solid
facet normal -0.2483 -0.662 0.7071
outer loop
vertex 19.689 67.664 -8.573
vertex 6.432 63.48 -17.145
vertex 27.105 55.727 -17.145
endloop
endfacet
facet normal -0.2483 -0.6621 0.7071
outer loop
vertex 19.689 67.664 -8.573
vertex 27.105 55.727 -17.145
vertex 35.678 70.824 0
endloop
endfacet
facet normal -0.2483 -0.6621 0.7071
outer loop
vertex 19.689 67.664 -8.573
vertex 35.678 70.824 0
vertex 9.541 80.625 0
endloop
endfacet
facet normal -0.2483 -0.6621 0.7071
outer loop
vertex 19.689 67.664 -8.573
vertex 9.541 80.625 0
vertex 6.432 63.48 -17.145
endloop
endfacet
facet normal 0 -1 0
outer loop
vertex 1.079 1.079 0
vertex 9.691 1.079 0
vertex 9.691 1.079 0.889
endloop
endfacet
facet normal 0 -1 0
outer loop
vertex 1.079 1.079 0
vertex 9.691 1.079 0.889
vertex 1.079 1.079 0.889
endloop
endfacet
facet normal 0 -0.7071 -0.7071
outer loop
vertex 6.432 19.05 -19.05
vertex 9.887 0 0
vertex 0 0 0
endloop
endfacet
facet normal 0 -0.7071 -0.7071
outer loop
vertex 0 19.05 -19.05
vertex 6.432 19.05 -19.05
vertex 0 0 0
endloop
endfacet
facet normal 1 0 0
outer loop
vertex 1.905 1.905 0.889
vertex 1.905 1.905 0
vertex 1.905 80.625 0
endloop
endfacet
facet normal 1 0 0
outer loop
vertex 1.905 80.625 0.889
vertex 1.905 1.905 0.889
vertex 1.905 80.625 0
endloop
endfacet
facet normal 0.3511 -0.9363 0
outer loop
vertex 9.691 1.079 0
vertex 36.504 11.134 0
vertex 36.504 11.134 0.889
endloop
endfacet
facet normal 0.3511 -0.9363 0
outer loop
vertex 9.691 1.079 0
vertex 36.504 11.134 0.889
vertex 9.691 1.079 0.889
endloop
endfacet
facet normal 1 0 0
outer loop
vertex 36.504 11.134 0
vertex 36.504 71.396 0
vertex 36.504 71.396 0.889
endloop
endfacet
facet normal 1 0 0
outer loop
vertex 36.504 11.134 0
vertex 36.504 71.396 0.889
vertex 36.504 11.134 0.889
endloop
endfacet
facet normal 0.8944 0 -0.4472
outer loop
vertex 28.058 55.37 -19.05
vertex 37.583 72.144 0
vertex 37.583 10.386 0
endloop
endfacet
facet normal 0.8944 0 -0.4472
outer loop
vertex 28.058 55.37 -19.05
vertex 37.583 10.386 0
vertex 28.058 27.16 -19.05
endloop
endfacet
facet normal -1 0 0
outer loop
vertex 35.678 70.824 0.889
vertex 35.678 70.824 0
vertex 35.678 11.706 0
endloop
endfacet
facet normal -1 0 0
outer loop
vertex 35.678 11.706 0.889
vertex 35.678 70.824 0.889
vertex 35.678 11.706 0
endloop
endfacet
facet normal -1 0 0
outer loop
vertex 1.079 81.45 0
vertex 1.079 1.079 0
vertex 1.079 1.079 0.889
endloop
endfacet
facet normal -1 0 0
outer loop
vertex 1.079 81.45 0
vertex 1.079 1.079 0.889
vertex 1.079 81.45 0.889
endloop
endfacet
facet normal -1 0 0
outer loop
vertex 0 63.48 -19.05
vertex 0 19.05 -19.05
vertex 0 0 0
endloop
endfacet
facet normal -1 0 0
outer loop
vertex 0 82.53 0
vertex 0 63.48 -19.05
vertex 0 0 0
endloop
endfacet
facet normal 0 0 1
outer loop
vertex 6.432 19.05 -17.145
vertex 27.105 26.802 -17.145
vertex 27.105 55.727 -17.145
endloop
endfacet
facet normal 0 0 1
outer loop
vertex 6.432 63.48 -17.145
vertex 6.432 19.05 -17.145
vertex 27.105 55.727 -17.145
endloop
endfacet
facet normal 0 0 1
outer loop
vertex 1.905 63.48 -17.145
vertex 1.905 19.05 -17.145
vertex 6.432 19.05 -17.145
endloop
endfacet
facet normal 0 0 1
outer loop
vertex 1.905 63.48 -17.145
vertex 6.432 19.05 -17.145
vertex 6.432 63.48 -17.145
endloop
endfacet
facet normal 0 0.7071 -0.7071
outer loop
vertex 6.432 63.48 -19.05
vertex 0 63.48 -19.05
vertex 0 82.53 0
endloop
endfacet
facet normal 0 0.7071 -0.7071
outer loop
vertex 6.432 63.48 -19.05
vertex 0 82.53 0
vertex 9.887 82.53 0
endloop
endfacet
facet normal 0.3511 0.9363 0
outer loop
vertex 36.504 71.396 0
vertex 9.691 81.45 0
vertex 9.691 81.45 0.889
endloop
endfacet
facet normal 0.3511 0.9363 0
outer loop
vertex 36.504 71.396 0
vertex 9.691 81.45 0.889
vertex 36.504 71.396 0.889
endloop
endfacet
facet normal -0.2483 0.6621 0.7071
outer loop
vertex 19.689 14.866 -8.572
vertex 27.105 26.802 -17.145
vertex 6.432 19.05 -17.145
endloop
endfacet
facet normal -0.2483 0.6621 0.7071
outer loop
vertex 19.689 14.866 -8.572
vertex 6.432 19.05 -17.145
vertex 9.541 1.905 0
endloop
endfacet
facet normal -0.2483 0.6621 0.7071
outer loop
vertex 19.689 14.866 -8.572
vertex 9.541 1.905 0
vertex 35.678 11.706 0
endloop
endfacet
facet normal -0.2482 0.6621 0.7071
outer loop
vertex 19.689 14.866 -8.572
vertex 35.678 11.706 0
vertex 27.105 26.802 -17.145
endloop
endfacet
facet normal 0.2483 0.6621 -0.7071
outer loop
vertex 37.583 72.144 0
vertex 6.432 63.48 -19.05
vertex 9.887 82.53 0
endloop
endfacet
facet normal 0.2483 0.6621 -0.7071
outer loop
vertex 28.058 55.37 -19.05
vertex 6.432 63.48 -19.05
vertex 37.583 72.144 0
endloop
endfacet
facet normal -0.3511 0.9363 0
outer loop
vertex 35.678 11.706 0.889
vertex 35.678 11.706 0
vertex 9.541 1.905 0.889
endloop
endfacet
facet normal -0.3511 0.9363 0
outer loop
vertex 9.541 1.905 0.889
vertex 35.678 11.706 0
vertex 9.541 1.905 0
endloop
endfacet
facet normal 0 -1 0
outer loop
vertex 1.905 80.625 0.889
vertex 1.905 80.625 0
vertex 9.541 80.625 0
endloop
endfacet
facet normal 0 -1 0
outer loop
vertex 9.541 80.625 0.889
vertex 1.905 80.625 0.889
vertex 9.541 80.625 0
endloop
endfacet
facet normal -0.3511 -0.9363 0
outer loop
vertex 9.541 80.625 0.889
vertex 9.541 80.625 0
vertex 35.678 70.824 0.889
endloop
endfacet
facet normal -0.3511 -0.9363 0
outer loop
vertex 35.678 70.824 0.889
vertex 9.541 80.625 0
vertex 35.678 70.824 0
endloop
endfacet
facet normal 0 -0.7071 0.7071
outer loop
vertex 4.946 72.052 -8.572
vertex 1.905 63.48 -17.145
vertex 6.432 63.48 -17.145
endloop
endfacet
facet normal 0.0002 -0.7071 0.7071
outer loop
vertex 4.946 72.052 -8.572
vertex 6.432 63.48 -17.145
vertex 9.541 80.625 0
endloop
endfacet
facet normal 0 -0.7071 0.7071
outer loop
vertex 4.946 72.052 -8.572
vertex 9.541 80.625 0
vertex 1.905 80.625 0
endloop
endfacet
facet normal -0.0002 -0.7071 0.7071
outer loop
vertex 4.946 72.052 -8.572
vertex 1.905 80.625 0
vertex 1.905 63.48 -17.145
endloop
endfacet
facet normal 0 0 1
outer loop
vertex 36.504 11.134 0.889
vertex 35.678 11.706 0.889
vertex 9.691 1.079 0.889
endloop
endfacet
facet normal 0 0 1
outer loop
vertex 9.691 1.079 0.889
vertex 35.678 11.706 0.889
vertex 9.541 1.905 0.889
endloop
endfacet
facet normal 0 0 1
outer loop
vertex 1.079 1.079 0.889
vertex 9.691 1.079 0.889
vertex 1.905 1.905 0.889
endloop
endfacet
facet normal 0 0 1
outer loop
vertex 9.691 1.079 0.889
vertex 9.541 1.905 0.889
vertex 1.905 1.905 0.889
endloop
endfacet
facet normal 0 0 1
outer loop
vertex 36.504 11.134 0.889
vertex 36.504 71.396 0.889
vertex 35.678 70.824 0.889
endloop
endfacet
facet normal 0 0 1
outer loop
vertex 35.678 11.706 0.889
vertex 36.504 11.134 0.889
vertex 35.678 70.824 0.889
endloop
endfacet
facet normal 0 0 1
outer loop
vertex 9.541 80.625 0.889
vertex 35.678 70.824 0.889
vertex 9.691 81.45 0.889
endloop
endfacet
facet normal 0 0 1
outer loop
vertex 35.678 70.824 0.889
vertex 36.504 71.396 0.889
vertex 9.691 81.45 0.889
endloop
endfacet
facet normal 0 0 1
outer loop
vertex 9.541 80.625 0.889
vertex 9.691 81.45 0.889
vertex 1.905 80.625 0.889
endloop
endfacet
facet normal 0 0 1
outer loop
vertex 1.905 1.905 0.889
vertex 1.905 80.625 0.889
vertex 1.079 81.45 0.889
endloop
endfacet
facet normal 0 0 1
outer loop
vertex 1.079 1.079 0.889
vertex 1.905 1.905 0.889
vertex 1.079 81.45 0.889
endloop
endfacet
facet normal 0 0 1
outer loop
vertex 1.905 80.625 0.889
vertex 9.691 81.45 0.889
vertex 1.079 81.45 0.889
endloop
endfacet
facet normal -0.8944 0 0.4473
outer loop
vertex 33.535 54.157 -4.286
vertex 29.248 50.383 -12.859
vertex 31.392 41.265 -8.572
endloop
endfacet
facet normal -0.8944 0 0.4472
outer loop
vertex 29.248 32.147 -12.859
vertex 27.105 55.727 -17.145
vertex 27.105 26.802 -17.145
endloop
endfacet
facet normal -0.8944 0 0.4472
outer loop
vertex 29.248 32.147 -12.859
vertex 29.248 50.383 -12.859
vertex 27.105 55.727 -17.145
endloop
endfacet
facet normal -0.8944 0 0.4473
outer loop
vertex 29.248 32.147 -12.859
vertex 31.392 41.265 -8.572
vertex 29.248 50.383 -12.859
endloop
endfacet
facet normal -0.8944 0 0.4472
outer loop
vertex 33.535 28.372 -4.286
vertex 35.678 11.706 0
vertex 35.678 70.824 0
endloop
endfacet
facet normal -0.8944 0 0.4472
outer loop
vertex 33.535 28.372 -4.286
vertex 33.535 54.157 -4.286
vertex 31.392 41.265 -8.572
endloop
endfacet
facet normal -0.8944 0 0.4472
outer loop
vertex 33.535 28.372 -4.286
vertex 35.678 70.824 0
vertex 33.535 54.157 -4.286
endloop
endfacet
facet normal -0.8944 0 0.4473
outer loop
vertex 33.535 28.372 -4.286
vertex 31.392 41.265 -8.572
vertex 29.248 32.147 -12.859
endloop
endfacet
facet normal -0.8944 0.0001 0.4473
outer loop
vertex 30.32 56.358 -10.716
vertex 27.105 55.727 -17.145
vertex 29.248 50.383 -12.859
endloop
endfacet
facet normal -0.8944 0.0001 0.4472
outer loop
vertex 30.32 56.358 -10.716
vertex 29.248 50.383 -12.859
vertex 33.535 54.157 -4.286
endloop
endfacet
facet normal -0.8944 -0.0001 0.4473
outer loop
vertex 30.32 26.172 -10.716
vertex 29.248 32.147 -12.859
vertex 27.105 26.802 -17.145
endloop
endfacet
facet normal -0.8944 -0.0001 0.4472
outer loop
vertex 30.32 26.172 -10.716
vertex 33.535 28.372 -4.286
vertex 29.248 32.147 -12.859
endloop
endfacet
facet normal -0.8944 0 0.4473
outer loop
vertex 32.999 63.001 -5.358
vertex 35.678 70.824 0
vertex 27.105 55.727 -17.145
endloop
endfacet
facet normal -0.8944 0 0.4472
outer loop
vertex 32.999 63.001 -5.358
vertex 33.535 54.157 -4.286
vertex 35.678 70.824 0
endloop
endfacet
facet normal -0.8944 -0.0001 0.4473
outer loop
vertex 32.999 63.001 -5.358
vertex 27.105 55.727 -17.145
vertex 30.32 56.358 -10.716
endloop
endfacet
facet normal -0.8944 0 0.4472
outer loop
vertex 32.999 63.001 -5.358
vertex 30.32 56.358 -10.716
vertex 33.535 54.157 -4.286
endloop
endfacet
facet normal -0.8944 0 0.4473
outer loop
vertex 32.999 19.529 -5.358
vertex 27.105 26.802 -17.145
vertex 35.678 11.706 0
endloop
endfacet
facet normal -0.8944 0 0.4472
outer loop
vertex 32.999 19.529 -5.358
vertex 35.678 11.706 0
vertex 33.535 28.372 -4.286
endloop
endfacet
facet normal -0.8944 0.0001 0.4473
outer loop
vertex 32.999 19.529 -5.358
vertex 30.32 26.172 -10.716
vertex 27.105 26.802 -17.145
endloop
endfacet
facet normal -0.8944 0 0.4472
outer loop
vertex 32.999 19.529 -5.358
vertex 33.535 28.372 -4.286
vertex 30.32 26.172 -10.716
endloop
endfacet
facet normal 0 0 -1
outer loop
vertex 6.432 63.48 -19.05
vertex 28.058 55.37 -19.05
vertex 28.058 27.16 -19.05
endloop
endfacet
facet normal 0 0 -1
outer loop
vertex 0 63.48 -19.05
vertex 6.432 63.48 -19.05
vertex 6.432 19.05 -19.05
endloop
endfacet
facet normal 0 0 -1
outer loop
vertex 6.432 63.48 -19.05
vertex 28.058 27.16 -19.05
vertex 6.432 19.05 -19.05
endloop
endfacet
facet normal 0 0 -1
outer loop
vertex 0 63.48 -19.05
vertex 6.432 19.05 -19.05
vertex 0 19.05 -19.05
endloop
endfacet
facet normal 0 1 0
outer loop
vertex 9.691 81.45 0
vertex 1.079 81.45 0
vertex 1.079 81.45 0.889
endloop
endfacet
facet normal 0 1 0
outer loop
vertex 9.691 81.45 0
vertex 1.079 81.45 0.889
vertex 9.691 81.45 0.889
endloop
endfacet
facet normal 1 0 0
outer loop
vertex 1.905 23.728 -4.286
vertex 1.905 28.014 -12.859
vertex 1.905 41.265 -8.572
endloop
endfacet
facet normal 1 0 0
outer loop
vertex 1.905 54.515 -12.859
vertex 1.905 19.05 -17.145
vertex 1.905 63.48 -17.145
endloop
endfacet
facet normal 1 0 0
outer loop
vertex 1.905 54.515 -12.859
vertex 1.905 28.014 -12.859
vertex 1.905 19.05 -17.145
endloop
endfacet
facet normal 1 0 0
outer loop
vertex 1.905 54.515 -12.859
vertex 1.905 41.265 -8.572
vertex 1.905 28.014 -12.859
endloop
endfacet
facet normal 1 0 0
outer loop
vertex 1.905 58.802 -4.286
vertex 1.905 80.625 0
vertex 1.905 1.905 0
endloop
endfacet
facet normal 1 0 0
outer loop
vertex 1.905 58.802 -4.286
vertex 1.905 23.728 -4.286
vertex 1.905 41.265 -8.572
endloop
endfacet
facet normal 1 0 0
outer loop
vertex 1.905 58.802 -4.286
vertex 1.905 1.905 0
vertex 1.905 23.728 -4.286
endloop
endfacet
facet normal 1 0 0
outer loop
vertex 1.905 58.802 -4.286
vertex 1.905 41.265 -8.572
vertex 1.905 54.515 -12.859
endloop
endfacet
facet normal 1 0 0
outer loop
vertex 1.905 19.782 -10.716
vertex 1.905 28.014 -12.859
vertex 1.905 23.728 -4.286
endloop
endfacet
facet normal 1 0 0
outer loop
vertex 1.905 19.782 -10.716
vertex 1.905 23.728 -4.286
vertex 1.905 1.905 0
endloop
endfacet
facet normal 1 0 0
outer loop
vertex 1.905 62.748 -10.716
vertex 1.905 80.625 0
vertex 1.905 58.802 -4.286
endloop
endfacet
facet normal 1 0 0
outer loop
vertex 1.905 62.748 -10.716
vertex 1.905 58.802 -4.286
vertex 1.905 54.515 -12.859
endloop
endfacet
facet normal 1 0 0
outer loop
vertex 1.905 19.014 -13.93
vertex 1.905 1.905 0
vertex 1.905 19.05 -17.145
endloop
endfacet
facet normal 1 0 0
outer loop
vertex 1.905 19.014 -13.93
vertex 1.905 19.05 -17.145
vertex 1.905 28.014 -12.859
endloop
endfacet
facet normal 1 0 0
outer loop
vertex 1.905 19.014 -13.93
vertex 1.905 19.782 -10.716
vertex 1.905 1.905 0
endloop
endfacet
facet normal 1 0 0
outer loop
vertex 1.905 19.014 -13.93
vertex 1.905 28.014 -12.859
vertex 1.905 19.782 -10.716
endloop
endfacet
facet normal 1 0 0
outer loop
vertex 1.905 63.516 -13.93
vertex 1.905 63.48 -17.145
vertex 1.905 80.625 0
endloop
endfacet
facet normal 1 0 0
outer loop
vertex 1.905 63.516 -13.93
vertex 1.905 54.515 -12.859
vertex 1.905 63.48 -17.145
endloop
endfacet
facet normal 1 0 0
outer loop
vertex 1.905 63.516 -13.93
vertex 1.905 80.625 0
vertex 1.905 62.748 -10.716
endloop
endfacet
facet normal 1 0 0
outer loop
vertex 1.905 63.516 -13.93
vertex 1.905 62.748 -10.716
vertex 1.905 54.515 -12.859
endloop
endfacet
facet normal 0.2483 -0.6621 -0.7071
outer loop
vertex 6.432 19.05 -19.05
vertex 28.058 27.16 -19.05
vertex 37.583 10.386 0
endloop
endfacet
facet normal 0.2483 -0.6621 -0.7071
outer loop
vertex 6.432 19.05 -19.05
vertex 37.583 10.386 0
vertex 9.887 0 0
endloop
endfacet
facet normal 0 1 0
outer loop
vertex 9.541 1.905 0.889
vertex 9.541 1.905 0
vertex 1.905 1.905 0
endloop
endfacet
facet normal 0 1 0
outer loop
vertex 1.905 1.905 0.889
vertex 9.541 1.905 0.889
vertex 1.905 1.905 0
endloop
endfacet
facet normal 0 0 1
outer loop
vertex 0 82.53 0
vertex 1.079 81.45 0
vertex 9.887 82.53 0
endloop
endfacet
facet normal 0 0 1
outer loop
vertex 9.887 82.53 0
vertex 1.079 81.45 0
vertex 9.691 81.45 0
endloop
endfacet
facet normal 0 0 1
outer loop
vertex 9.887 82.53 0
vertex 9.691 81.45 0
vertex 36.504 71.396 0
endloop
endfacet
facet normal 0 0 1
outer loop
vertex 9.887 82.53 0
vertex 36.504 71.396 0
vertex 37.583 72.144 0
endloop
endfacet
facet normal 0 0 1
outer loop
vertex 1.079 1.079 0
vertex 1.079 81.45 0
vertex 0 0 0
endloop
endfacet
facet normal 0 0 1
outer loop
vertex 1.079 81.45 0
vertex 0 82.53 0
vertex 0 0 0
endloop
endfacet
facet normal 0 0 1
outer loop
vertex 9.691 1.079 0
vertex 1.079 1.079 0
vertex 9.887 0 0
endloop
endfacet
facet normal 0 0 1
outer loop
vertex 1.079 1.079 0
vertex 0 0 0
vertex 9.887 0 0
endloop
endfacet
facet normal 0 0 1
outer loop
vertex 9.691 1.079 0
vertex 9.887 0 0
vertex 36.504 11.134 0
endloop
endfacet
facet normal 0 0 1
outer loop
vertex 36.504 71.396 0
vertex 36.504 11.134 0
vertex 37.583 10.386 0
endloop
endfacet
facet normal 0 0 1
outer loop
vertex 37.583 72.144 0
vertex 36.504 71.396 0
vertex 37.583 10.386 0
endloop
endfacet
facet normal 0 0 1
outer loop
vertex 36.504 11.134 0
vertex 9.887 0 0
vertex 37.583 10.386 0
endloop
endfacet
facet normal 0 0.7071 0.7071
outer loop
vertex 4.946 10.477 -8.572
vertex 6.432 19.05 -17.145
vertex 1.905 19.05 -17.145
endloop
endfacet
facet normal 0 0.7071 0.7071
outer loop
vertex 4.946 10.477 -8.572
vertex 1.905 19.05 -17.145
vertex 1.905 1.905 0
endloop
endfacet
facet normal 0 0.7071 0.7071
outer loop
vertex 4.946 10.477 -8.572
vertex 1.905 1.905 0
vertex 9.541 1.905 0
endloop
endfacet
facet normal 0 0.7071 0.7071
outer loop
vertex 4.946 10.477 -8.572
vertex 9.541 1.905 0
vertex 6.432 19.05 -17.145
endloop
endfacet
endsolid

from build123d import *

# Parameters (mm, degrees)
BOSS_EXTRUDE1_DEPTH = 0.889
LOFT2_DEPTH         = 82.529690579
LOFT2_START         = 4.746357977
LOFT2_2_DEPTH       = 59.253642023
LOFT2_START_2       = -13.360997113
LOFT2_3_DEPTH       = 13.360997113
LOFT2_START_3       = -53.387286303
LOFT2_4_DEPTH       = 59.387286303
LOFT2_START_4       = -71.244406959
LOFT2_5_DEPTH       = 13.360997113


with BuildPart() as part:
    # Sketch2 → Boss-Extrude1 (new body)
    with BuildSketch(Plane.XY):
        Polygon((1.079234415, 1.079234415), (1.079234415, 81.450456164), (9.69091533, 81.450456164), (36.503516987, 71.395730542), (36.503516987, 11.133960037), (9.69091533, 1.079234415), align=None)
        Polygon((1.904531321, 1.904531321), (1.904531321, 80.625159258), (9.54126046, 80.625159258), (35.678220081, 70.8237994), (35.678220081, 11.705891179), (9.54126046, 1.904531321), align=None, mode=Mode.SUBTRACT)
    extrude(amount=BOSS_EXTRUDE1_DEPTH)

    # Loft2: read off the stored shape, not the designer's step
    # Loft2 outline → Loft2 (add)
    with BuildSketch(Plane(origin=(0, 0, 0), x_dir=(1, 0, 0), z_dir=(0, 1, 0))):
        Polygon((0, 0), (37.582751402, 0), (28.057751402, 19.05), (0, 19.05), align=None)
    extrude(amount=LOFT2_DEPTH)

    # Loft2 2 outline → Loft2 2 (cut)
    with BuildSketch(Plane(origin=(0, 0, 0), x_dir=(0.9918794395900915, -0.08993102167340751, -0.08993102167340765), z_dir=(0.12718167052860177, 0.7013646778536657, 0.7013646778536667)).offset(LOFT2_START)):
        Polygon((2.384353581, 58.357303857), (30.789607102, 51.013257415), (37, 49.40758916), (37, 73), (-9, 73), (-9, 58.357303857), align=None)
    extrude(amount=LOFT2_2_DEPTH, mode=Mode.SUBTRACT)

    # Loft2 3 outline → Loft2 3 (cut)
    with BuildSketch(Plane(origin=(0, 0, 0), x_dir=(0.9918794395900915, -0.08993102167340751, -0.08993102167340765), z_dir=(0.12718167052860177, 0.7013646778536657, 0.7013646778536667)).offset(LOFT2_START_2)):
        Polygon((37, 49.40758916), (30.789607102, 51.013257415), (2.384353581, 58.357303857), (-9, 58.357303857), (-9, 1), (37, 1), align=None)
    extrude(amount=LOFT2_3_DEPTH, mode=Mode.SUBTRACT)

    # Loft2 4 outline → Loft2 4 (cut)
    with BuildSketch(Plane(origin=(0, 0, 0), x_dir=(0.9918794395900911, 0.08993102167341009, -0.08993102167341009), z_dir=(0.12718167052860532, -0.7013646778536659, 0.7013646778536659)).offset(LOFT2_START_3)):
        Polygon((38.211586494, 7.344046443), (9.806332973, 0), (-1, 0), (-1, -15), (45, -15), (45, 9.099159244), align=None)
    extrude(amount=LOFT2_4_DEPTH, mode=Mode.SUBTRACT)

    # Loft2 5 outline → Loft2 5 (cut)
    with BuildSketch(Plane(origin=(0, 0, 0), x_dir=(0.9918794395900911, 0.08993102167341009, -0.08993102167341009), z_dir=(0.12718167052860532, -0.7013646778536659, 0.7013646778536659)).offset(LOFT2_START_4)):
        Polygon((-1, 0), (9.806332973, 0), (38.211586494, 7.344046443), (45, 9.099159244), (45, 58), (-1, 58), align=None)
    extrude(amount=LOFT2_5_DEPTH, mode=Mode.SUBTRACT)

    # Sketch5 → section 0 of cut_loft2
    with BuildSketch(Plane.XY.offset(-17.145), mode=Mode.PRIVATE) as cut_loft2_s0:
        with BuildLine():
            Line((27.105251402, 26.8023965), (6.432194068, 19.05))
            Line((6.432194068, 19.05), (1.905, 19.05))
            Line((1.905, 19.05), (1.905, 63.479690579))
            Line((1.905, 63.479690579), (6.432194068, 63.479690579))
            Line((6.432194068, 63.479690579), (27.105251402, 55.727294079))
            Line((27.105251402, 55.727294079), (27.105251402, 26.8023965))
        make_face()
    # loft up to a face of the part (cut_loft2)
    loft([cut_loft2_s0.sketch, part.faces().sort_by_distance((17.91973196, 41.264845289, 0))[0]], mode=Mode.SUBTRACT)


solid = part.part
